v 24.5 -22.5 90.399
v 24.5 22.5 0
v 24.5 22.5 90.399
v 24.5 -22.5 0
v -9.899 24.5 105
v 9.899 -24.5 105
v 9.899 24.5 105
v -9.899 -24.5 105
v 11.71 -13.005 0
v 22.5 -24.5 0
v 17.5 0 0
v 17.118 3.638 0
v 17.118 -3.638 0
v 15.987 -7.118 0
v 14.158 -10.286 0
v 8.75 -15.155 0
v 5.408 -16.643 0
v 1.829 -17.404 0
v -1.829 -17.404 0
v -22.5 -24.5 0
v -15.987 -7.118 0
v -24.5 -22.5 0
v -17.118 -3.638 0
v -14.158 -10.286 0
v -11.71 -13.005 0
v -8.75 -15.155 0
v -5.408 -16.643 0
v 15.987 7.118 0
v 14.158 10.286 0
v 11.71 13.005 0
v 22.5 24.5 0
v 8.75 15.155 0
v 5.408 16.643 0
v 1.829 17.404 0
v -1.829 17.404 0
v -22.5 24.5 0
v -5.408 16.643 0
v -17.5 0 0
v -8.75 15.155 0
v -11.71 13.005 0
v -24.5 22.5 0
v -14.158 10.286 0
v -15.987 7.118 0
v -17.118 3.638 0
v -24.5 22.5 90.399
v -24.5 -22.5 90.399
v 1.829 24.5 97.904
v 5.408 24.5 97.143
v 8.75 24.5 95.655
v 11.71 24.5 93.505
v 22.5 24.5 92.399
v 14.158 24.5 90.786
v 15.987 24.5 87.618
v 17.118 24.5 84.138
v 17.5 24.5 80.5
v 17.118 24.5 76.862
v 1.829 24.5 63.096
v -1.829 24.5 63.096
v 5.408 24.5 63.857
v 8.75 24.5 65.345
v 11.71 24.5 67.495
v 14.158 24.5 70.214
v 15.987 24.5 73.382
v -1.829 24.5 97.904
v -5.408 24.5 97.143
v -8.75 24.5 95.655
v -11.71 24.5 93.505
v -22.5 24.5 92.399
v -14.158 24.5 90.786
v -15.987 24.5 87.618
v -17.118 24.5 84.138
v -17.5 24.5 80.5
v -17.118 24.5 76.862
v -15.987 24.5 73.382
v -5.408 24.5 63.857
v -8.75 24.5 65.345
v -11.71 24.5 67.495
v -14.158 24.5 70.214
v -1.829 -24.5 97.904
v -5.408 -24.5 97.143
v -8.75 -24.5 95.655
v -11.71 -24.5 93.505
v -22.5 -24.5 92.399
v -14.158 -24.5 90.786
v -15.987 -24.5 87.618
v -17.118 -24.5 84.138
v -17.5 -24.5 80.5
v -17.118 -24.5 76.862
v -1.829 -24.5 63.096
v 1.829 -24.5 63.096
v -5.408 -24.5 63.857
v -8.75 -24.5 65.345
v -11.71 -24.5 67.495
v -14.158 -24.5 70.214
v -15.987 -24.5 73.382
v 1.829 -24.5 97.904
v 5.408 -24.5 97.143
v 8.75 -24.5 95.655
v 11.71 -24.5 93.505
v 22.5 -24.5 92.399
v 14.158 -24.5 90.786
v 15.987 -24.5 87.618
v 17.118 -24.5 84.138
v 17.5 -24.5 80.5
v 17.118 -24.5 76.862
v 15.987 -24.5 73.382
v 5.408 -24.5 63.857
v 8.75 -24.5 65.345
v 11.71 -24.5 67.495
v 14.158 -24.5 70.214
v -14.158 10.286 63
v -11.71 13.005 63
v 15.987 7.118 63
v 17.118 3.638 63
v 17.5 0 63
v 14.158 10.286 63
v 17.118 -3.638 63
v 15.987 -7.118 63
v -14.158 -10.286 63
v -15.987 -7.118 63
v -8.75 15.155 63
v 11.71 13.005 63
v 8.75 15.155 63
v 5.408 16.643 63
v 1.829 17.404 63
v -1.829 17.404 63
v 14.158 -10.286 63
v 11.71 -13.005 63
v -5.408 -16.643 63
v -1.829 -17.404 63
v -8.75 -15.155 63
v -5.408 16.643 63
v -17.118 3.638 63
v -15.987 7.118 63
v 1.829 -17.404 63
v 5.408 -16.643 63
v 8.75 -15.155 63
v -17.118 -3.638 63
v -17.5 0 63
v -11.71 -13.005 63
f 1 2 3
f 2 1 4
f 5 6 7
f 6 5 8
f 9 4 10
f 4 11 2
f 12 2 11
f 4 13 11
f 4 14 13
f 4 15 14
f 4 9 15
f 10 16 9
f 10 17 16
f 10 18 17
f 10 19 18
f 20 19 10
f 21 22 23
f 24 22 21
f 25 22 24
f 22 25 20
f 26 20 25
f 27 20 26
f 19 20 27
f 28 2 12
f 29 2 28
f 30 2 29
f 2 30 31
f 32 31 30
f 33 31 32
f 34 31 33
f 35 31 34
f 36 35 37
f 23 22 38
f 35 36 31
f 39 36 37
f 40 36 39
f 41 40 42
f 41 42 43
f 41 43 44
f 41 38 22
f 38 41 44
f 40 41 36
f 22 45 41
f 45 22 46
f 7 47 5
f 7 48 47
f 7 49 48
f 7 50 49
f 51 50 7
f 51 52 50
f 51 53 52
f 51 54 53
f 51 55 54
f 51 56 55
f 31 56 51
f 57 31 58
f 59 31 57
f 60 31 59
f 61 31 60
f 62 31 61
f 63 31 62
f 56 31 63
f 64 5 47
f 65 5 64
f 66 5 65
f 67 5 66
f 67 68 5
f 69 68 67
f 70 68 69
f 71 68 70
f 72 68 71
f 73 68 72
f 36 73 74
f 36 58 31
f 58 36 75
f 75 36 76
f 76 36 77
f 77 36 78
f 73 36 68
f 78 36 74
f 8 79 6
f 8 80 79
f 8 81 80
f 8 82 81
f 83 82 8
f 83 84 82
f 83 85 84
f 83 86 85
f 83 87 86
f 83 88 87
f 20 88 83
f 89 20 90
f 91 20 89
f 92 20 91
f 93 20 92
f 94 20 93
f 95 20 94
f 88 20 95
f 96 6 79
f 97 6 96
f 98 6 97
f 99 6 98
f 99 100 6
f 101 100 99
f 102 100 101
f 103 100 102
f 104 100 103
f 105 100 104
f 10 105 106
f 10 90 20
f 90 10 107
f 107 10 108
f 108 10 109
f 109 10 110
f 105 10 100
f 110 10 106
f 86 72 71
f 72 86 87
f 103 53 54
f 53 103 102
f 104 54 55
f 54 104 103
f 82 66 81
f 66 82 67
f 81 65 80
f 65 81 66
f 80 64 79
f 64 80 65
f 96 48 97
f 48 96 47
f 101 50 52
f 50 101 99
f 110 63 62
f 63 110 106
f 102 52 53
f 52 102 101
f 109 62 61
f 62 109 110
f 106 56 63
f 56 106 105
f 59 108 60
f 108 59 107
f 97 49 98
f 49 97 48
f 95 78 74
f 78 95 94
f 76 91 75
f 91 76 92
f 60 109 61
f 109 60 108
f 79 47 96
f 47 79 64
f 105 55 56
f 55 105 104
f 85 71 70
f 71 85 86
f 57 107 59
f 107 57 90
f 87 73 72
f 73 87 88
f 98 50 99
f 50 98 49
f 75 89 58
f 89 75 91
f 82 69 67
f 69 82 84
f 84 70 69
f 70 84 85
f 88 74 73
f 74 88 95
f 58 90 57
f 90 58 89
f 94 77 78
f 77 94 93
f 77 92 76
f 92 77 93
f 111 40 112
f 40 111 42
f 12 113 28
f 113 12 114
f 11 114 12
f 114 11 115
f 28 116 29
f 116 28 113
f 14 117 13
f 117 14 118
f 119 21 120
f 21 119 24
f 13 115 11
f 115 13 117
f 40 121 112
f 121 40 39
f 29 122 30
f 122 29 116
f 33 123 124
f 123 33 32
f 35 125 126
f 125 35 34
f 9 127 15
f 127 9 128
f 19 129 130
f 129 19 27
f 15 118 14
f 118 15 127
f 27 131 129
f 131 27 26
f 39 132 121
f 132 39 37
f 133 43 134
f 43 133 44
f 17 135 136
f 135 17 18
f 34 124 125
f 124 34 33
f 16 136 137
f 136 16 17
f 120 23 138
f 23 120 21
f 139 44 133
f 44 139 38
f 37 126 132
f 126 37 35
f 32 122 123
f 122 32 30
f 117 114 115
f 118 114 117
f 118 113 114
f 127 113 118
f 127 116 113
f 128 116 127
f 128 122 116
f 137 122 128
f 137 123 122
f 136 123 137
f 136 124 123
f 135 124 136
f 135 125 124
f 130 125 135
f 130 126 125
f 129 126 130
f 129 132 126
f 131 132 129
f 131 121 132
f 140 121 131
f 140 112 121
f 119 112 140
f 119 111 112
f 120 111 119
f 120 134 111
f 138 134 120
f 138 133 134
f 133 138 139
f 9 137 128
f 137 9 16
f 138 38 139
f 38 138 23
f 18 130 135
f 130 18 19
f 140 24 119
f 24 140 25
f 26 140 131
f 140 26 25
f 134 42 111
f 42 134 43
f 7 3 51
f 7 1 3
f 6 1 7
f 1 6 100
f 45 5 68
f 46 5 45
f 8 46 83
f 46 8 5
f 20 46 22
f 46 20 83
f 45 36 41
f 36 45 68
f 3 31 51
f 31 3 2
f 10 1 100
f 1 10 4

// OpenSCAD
main_tube_diameter=35;	
wall_thickness=main_tube_diameter/5;
width=main_tube_diameter+2*wall_thickness;
depth=width;
height=main_tube_diameter*1.8+main_tube_diameter+wall_thickness;
radius=main_tube_diameter/2;


difference () {
	translate([-(width/2),-(width/2),0])
	cube ([width,depth,height]);

	translate([0,radius+wall_thickness,main_tube_diameter*1.8+radius])
    rotate([90,0,0])
    cylinder(h=width,r1=radius,r2=radius);

   cylinder(h=main_tube_diameter*1.8,r1=radius,r2=radius);

   translate([0,-(depth/2),height+sqrt(2)*wall_thickness])
   rotate([0,45,0])
   cube([width,width,width]);

   translate([-width/2-(sqrt(2)*wall_thickness),-(depth/2),height-wall_thickness-radius])
   rotate([0,-45,0])
   cube([width,width,width]);

   translate([-width+2,0,0])
   rotate([0,0,225])
   cube([height,height,height]);

   translate([-width+2,0,0])
   rotate([0,0,45])
   cube([height,height,height]);

   translate([+width-2,0,0])
   rotate([0,0,45])
   cube([height,height,height]);

   translate([0,-width+2,0])
   rotate([0,0,-45])
   cube([height,height,height]);


   }    
